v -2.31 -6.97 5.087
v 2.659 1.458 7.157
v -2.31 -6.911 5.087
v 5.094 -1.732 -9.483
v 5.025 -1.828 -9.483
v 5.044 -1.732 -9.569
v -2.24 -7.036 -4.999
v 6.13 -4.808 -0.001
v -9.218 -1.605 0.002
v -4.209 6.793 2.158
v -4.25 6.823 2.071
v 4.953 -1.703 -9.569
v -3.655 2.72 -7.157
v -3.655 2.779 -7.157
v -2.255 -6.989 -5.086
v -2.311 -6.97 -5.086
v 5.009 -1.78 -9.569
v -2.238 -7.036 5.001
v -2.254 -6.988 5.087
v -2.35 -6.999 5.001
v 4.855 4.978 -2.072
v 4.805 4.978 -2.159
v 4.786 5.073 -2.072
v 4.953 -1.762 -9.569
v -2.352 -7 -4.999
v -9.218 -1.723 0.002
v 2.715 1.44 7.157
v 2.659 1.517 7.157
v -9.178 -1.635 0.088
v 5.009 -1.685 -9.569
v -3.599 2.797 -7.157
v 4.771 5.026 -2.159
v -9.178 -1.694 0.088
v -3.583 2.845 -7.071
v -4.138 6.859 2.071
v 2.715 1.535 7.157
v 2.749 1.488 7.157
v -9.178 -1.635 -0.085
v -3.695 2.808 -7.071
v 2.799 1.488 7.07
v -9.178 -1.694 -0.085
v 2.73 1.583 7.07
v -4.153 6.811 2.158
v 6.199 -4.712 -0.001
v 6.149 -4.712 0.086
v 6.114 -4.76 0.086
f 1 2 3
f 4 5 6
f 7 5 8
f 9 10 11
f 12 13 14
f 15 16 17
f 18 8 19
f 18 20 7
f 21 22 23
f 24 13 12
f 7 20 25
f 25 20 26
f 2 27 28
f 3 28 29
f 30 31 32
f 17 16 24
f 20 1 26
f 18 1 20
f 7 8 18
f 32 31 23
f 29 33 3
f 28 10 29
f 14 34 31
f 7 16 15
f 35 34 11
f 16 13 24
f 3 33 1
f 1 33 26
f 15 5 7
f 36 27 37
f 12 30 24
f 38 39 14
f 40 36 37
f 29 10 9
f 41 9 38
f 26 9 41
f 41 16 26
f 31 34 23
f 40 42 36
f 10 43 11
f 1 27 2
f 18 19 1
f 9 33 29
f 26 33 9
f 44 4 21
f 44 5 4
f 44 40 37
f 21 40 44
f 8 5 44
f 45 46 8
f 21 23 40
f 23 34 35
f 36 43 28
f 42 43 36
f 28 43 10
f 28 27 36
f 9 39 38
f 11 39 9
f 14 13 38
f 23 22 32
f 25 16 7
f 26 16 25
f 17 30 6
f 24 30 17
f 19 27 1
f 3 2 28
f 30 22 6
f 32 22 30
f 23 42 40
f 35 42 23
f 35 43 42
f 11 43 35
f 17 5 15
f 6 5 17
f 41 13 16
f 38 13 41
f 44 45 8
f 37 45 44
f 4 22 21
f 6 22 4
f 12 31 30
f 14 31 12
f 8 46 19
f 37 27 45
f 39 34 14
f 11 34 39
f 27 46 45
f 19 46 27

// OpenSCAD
// Auto-generated OpenSCAD file

    inner_points = 10*[[0.47553456087715823, 0.4978078842969692, -0.2072352496078125], [-0.22709237834801976, -0.6940962000115061, -0.4999467766849563], [-0.36142103174737733, 0.2749515102768153, -0.7070755966518479], [0.6098632142765158, -0.47123982599135217, -0.00010642964092089091], [-0.41688364699083813, 0.6763916464639828, 0.20712881996862775], [-0.9137159203613099, -0.16641181407448244, 0.00015051424090967158], [0.2699180298323196, 0.14875469252611018, 0.7070315120518591], [-0.22691424353815204, -0.694048768012355, 0.500053206324141], [0.4993618307547157, -0.17324932327067738, -0.948257843987832]];

    outer_points = 10*[[-0.42003278146638656, 0.681501101519495, 0.18948721966919727], [-0.3451825718394467, -0.7303265261001592, 0.15572043112390738], [-0.09183323192223902, -0.024412712290332116, 0.8171581072778895], [-0.6733821213835942, -0.024412712290332116, -0.4719504564847848], [0.5617527129175098, 0.5235691569685188, 0.2951032407441999], [0.6146798037179536, -0.47474373238785456, 0.2712265155849332], [0.15053554958787962, 0.5235691569685188, -0.6164341663780378], [0.2034626403883234, -0.47474373238785456, -0.6403108915373046], [-1.0260745241448967, -0.06546983679345328, 0.4628877014666302]];

    // Convex hull for inner set (I)
    module inner_hull() {
        hull() {
            for (p = inner_points) {
                translate(p) sphere(r=0.1);
            }
        }
    }

    // Convex hull for outer set (O) minus inner hull (O \ I)
    module outer_minus_inner() {
        difference() {
            hull() {
                for (p = outer_points) {
                    translate(p) sphere(r=0.1);
                }
            }
            inner_hull(); // Subtract inner hull
        }
    }

    // Convex hull for outer set (O) minus all translated inner hulls
    module outer_minus_AllTranslationInner() {
        difference() {
            hull() {
                for (p = outer_points) {
                    translate(p) sphere(r=0.1);
                }
            }
            hull() {
                translate([0,0,50]) inner_hull();
                translate([0,0,-50]) inner_hull();
            }; // Subtract translated inner hulls
        }
    }

    // Difference between outer_minus_inner and outer_minus_AllTranslationInner
    module outer_minus_inner_diff() {
        difference() {
            // Outer minus inner
            difference() {
                hull() {
                    for (p = outer_points) {
                        translate(p) sphere(r=0.1);
                    }
                }
                inner_hull();
            }

            // Subtract Outer minus AllTranslationInner
            difference() {
                hull() {
                    for (p = outer_points) {
                        translate(p) sphere(r=0.1);
                    }
                }
                hull() {
                    translate([0,0,50]) inner_hull();
                    translate([0,0,-50]) inner_hull();
                };
            }
        }
    }

    // Rendering all with colors applied
    color([1, 0, 0, 0.5]) inner_hull(); // Transparent red
    
